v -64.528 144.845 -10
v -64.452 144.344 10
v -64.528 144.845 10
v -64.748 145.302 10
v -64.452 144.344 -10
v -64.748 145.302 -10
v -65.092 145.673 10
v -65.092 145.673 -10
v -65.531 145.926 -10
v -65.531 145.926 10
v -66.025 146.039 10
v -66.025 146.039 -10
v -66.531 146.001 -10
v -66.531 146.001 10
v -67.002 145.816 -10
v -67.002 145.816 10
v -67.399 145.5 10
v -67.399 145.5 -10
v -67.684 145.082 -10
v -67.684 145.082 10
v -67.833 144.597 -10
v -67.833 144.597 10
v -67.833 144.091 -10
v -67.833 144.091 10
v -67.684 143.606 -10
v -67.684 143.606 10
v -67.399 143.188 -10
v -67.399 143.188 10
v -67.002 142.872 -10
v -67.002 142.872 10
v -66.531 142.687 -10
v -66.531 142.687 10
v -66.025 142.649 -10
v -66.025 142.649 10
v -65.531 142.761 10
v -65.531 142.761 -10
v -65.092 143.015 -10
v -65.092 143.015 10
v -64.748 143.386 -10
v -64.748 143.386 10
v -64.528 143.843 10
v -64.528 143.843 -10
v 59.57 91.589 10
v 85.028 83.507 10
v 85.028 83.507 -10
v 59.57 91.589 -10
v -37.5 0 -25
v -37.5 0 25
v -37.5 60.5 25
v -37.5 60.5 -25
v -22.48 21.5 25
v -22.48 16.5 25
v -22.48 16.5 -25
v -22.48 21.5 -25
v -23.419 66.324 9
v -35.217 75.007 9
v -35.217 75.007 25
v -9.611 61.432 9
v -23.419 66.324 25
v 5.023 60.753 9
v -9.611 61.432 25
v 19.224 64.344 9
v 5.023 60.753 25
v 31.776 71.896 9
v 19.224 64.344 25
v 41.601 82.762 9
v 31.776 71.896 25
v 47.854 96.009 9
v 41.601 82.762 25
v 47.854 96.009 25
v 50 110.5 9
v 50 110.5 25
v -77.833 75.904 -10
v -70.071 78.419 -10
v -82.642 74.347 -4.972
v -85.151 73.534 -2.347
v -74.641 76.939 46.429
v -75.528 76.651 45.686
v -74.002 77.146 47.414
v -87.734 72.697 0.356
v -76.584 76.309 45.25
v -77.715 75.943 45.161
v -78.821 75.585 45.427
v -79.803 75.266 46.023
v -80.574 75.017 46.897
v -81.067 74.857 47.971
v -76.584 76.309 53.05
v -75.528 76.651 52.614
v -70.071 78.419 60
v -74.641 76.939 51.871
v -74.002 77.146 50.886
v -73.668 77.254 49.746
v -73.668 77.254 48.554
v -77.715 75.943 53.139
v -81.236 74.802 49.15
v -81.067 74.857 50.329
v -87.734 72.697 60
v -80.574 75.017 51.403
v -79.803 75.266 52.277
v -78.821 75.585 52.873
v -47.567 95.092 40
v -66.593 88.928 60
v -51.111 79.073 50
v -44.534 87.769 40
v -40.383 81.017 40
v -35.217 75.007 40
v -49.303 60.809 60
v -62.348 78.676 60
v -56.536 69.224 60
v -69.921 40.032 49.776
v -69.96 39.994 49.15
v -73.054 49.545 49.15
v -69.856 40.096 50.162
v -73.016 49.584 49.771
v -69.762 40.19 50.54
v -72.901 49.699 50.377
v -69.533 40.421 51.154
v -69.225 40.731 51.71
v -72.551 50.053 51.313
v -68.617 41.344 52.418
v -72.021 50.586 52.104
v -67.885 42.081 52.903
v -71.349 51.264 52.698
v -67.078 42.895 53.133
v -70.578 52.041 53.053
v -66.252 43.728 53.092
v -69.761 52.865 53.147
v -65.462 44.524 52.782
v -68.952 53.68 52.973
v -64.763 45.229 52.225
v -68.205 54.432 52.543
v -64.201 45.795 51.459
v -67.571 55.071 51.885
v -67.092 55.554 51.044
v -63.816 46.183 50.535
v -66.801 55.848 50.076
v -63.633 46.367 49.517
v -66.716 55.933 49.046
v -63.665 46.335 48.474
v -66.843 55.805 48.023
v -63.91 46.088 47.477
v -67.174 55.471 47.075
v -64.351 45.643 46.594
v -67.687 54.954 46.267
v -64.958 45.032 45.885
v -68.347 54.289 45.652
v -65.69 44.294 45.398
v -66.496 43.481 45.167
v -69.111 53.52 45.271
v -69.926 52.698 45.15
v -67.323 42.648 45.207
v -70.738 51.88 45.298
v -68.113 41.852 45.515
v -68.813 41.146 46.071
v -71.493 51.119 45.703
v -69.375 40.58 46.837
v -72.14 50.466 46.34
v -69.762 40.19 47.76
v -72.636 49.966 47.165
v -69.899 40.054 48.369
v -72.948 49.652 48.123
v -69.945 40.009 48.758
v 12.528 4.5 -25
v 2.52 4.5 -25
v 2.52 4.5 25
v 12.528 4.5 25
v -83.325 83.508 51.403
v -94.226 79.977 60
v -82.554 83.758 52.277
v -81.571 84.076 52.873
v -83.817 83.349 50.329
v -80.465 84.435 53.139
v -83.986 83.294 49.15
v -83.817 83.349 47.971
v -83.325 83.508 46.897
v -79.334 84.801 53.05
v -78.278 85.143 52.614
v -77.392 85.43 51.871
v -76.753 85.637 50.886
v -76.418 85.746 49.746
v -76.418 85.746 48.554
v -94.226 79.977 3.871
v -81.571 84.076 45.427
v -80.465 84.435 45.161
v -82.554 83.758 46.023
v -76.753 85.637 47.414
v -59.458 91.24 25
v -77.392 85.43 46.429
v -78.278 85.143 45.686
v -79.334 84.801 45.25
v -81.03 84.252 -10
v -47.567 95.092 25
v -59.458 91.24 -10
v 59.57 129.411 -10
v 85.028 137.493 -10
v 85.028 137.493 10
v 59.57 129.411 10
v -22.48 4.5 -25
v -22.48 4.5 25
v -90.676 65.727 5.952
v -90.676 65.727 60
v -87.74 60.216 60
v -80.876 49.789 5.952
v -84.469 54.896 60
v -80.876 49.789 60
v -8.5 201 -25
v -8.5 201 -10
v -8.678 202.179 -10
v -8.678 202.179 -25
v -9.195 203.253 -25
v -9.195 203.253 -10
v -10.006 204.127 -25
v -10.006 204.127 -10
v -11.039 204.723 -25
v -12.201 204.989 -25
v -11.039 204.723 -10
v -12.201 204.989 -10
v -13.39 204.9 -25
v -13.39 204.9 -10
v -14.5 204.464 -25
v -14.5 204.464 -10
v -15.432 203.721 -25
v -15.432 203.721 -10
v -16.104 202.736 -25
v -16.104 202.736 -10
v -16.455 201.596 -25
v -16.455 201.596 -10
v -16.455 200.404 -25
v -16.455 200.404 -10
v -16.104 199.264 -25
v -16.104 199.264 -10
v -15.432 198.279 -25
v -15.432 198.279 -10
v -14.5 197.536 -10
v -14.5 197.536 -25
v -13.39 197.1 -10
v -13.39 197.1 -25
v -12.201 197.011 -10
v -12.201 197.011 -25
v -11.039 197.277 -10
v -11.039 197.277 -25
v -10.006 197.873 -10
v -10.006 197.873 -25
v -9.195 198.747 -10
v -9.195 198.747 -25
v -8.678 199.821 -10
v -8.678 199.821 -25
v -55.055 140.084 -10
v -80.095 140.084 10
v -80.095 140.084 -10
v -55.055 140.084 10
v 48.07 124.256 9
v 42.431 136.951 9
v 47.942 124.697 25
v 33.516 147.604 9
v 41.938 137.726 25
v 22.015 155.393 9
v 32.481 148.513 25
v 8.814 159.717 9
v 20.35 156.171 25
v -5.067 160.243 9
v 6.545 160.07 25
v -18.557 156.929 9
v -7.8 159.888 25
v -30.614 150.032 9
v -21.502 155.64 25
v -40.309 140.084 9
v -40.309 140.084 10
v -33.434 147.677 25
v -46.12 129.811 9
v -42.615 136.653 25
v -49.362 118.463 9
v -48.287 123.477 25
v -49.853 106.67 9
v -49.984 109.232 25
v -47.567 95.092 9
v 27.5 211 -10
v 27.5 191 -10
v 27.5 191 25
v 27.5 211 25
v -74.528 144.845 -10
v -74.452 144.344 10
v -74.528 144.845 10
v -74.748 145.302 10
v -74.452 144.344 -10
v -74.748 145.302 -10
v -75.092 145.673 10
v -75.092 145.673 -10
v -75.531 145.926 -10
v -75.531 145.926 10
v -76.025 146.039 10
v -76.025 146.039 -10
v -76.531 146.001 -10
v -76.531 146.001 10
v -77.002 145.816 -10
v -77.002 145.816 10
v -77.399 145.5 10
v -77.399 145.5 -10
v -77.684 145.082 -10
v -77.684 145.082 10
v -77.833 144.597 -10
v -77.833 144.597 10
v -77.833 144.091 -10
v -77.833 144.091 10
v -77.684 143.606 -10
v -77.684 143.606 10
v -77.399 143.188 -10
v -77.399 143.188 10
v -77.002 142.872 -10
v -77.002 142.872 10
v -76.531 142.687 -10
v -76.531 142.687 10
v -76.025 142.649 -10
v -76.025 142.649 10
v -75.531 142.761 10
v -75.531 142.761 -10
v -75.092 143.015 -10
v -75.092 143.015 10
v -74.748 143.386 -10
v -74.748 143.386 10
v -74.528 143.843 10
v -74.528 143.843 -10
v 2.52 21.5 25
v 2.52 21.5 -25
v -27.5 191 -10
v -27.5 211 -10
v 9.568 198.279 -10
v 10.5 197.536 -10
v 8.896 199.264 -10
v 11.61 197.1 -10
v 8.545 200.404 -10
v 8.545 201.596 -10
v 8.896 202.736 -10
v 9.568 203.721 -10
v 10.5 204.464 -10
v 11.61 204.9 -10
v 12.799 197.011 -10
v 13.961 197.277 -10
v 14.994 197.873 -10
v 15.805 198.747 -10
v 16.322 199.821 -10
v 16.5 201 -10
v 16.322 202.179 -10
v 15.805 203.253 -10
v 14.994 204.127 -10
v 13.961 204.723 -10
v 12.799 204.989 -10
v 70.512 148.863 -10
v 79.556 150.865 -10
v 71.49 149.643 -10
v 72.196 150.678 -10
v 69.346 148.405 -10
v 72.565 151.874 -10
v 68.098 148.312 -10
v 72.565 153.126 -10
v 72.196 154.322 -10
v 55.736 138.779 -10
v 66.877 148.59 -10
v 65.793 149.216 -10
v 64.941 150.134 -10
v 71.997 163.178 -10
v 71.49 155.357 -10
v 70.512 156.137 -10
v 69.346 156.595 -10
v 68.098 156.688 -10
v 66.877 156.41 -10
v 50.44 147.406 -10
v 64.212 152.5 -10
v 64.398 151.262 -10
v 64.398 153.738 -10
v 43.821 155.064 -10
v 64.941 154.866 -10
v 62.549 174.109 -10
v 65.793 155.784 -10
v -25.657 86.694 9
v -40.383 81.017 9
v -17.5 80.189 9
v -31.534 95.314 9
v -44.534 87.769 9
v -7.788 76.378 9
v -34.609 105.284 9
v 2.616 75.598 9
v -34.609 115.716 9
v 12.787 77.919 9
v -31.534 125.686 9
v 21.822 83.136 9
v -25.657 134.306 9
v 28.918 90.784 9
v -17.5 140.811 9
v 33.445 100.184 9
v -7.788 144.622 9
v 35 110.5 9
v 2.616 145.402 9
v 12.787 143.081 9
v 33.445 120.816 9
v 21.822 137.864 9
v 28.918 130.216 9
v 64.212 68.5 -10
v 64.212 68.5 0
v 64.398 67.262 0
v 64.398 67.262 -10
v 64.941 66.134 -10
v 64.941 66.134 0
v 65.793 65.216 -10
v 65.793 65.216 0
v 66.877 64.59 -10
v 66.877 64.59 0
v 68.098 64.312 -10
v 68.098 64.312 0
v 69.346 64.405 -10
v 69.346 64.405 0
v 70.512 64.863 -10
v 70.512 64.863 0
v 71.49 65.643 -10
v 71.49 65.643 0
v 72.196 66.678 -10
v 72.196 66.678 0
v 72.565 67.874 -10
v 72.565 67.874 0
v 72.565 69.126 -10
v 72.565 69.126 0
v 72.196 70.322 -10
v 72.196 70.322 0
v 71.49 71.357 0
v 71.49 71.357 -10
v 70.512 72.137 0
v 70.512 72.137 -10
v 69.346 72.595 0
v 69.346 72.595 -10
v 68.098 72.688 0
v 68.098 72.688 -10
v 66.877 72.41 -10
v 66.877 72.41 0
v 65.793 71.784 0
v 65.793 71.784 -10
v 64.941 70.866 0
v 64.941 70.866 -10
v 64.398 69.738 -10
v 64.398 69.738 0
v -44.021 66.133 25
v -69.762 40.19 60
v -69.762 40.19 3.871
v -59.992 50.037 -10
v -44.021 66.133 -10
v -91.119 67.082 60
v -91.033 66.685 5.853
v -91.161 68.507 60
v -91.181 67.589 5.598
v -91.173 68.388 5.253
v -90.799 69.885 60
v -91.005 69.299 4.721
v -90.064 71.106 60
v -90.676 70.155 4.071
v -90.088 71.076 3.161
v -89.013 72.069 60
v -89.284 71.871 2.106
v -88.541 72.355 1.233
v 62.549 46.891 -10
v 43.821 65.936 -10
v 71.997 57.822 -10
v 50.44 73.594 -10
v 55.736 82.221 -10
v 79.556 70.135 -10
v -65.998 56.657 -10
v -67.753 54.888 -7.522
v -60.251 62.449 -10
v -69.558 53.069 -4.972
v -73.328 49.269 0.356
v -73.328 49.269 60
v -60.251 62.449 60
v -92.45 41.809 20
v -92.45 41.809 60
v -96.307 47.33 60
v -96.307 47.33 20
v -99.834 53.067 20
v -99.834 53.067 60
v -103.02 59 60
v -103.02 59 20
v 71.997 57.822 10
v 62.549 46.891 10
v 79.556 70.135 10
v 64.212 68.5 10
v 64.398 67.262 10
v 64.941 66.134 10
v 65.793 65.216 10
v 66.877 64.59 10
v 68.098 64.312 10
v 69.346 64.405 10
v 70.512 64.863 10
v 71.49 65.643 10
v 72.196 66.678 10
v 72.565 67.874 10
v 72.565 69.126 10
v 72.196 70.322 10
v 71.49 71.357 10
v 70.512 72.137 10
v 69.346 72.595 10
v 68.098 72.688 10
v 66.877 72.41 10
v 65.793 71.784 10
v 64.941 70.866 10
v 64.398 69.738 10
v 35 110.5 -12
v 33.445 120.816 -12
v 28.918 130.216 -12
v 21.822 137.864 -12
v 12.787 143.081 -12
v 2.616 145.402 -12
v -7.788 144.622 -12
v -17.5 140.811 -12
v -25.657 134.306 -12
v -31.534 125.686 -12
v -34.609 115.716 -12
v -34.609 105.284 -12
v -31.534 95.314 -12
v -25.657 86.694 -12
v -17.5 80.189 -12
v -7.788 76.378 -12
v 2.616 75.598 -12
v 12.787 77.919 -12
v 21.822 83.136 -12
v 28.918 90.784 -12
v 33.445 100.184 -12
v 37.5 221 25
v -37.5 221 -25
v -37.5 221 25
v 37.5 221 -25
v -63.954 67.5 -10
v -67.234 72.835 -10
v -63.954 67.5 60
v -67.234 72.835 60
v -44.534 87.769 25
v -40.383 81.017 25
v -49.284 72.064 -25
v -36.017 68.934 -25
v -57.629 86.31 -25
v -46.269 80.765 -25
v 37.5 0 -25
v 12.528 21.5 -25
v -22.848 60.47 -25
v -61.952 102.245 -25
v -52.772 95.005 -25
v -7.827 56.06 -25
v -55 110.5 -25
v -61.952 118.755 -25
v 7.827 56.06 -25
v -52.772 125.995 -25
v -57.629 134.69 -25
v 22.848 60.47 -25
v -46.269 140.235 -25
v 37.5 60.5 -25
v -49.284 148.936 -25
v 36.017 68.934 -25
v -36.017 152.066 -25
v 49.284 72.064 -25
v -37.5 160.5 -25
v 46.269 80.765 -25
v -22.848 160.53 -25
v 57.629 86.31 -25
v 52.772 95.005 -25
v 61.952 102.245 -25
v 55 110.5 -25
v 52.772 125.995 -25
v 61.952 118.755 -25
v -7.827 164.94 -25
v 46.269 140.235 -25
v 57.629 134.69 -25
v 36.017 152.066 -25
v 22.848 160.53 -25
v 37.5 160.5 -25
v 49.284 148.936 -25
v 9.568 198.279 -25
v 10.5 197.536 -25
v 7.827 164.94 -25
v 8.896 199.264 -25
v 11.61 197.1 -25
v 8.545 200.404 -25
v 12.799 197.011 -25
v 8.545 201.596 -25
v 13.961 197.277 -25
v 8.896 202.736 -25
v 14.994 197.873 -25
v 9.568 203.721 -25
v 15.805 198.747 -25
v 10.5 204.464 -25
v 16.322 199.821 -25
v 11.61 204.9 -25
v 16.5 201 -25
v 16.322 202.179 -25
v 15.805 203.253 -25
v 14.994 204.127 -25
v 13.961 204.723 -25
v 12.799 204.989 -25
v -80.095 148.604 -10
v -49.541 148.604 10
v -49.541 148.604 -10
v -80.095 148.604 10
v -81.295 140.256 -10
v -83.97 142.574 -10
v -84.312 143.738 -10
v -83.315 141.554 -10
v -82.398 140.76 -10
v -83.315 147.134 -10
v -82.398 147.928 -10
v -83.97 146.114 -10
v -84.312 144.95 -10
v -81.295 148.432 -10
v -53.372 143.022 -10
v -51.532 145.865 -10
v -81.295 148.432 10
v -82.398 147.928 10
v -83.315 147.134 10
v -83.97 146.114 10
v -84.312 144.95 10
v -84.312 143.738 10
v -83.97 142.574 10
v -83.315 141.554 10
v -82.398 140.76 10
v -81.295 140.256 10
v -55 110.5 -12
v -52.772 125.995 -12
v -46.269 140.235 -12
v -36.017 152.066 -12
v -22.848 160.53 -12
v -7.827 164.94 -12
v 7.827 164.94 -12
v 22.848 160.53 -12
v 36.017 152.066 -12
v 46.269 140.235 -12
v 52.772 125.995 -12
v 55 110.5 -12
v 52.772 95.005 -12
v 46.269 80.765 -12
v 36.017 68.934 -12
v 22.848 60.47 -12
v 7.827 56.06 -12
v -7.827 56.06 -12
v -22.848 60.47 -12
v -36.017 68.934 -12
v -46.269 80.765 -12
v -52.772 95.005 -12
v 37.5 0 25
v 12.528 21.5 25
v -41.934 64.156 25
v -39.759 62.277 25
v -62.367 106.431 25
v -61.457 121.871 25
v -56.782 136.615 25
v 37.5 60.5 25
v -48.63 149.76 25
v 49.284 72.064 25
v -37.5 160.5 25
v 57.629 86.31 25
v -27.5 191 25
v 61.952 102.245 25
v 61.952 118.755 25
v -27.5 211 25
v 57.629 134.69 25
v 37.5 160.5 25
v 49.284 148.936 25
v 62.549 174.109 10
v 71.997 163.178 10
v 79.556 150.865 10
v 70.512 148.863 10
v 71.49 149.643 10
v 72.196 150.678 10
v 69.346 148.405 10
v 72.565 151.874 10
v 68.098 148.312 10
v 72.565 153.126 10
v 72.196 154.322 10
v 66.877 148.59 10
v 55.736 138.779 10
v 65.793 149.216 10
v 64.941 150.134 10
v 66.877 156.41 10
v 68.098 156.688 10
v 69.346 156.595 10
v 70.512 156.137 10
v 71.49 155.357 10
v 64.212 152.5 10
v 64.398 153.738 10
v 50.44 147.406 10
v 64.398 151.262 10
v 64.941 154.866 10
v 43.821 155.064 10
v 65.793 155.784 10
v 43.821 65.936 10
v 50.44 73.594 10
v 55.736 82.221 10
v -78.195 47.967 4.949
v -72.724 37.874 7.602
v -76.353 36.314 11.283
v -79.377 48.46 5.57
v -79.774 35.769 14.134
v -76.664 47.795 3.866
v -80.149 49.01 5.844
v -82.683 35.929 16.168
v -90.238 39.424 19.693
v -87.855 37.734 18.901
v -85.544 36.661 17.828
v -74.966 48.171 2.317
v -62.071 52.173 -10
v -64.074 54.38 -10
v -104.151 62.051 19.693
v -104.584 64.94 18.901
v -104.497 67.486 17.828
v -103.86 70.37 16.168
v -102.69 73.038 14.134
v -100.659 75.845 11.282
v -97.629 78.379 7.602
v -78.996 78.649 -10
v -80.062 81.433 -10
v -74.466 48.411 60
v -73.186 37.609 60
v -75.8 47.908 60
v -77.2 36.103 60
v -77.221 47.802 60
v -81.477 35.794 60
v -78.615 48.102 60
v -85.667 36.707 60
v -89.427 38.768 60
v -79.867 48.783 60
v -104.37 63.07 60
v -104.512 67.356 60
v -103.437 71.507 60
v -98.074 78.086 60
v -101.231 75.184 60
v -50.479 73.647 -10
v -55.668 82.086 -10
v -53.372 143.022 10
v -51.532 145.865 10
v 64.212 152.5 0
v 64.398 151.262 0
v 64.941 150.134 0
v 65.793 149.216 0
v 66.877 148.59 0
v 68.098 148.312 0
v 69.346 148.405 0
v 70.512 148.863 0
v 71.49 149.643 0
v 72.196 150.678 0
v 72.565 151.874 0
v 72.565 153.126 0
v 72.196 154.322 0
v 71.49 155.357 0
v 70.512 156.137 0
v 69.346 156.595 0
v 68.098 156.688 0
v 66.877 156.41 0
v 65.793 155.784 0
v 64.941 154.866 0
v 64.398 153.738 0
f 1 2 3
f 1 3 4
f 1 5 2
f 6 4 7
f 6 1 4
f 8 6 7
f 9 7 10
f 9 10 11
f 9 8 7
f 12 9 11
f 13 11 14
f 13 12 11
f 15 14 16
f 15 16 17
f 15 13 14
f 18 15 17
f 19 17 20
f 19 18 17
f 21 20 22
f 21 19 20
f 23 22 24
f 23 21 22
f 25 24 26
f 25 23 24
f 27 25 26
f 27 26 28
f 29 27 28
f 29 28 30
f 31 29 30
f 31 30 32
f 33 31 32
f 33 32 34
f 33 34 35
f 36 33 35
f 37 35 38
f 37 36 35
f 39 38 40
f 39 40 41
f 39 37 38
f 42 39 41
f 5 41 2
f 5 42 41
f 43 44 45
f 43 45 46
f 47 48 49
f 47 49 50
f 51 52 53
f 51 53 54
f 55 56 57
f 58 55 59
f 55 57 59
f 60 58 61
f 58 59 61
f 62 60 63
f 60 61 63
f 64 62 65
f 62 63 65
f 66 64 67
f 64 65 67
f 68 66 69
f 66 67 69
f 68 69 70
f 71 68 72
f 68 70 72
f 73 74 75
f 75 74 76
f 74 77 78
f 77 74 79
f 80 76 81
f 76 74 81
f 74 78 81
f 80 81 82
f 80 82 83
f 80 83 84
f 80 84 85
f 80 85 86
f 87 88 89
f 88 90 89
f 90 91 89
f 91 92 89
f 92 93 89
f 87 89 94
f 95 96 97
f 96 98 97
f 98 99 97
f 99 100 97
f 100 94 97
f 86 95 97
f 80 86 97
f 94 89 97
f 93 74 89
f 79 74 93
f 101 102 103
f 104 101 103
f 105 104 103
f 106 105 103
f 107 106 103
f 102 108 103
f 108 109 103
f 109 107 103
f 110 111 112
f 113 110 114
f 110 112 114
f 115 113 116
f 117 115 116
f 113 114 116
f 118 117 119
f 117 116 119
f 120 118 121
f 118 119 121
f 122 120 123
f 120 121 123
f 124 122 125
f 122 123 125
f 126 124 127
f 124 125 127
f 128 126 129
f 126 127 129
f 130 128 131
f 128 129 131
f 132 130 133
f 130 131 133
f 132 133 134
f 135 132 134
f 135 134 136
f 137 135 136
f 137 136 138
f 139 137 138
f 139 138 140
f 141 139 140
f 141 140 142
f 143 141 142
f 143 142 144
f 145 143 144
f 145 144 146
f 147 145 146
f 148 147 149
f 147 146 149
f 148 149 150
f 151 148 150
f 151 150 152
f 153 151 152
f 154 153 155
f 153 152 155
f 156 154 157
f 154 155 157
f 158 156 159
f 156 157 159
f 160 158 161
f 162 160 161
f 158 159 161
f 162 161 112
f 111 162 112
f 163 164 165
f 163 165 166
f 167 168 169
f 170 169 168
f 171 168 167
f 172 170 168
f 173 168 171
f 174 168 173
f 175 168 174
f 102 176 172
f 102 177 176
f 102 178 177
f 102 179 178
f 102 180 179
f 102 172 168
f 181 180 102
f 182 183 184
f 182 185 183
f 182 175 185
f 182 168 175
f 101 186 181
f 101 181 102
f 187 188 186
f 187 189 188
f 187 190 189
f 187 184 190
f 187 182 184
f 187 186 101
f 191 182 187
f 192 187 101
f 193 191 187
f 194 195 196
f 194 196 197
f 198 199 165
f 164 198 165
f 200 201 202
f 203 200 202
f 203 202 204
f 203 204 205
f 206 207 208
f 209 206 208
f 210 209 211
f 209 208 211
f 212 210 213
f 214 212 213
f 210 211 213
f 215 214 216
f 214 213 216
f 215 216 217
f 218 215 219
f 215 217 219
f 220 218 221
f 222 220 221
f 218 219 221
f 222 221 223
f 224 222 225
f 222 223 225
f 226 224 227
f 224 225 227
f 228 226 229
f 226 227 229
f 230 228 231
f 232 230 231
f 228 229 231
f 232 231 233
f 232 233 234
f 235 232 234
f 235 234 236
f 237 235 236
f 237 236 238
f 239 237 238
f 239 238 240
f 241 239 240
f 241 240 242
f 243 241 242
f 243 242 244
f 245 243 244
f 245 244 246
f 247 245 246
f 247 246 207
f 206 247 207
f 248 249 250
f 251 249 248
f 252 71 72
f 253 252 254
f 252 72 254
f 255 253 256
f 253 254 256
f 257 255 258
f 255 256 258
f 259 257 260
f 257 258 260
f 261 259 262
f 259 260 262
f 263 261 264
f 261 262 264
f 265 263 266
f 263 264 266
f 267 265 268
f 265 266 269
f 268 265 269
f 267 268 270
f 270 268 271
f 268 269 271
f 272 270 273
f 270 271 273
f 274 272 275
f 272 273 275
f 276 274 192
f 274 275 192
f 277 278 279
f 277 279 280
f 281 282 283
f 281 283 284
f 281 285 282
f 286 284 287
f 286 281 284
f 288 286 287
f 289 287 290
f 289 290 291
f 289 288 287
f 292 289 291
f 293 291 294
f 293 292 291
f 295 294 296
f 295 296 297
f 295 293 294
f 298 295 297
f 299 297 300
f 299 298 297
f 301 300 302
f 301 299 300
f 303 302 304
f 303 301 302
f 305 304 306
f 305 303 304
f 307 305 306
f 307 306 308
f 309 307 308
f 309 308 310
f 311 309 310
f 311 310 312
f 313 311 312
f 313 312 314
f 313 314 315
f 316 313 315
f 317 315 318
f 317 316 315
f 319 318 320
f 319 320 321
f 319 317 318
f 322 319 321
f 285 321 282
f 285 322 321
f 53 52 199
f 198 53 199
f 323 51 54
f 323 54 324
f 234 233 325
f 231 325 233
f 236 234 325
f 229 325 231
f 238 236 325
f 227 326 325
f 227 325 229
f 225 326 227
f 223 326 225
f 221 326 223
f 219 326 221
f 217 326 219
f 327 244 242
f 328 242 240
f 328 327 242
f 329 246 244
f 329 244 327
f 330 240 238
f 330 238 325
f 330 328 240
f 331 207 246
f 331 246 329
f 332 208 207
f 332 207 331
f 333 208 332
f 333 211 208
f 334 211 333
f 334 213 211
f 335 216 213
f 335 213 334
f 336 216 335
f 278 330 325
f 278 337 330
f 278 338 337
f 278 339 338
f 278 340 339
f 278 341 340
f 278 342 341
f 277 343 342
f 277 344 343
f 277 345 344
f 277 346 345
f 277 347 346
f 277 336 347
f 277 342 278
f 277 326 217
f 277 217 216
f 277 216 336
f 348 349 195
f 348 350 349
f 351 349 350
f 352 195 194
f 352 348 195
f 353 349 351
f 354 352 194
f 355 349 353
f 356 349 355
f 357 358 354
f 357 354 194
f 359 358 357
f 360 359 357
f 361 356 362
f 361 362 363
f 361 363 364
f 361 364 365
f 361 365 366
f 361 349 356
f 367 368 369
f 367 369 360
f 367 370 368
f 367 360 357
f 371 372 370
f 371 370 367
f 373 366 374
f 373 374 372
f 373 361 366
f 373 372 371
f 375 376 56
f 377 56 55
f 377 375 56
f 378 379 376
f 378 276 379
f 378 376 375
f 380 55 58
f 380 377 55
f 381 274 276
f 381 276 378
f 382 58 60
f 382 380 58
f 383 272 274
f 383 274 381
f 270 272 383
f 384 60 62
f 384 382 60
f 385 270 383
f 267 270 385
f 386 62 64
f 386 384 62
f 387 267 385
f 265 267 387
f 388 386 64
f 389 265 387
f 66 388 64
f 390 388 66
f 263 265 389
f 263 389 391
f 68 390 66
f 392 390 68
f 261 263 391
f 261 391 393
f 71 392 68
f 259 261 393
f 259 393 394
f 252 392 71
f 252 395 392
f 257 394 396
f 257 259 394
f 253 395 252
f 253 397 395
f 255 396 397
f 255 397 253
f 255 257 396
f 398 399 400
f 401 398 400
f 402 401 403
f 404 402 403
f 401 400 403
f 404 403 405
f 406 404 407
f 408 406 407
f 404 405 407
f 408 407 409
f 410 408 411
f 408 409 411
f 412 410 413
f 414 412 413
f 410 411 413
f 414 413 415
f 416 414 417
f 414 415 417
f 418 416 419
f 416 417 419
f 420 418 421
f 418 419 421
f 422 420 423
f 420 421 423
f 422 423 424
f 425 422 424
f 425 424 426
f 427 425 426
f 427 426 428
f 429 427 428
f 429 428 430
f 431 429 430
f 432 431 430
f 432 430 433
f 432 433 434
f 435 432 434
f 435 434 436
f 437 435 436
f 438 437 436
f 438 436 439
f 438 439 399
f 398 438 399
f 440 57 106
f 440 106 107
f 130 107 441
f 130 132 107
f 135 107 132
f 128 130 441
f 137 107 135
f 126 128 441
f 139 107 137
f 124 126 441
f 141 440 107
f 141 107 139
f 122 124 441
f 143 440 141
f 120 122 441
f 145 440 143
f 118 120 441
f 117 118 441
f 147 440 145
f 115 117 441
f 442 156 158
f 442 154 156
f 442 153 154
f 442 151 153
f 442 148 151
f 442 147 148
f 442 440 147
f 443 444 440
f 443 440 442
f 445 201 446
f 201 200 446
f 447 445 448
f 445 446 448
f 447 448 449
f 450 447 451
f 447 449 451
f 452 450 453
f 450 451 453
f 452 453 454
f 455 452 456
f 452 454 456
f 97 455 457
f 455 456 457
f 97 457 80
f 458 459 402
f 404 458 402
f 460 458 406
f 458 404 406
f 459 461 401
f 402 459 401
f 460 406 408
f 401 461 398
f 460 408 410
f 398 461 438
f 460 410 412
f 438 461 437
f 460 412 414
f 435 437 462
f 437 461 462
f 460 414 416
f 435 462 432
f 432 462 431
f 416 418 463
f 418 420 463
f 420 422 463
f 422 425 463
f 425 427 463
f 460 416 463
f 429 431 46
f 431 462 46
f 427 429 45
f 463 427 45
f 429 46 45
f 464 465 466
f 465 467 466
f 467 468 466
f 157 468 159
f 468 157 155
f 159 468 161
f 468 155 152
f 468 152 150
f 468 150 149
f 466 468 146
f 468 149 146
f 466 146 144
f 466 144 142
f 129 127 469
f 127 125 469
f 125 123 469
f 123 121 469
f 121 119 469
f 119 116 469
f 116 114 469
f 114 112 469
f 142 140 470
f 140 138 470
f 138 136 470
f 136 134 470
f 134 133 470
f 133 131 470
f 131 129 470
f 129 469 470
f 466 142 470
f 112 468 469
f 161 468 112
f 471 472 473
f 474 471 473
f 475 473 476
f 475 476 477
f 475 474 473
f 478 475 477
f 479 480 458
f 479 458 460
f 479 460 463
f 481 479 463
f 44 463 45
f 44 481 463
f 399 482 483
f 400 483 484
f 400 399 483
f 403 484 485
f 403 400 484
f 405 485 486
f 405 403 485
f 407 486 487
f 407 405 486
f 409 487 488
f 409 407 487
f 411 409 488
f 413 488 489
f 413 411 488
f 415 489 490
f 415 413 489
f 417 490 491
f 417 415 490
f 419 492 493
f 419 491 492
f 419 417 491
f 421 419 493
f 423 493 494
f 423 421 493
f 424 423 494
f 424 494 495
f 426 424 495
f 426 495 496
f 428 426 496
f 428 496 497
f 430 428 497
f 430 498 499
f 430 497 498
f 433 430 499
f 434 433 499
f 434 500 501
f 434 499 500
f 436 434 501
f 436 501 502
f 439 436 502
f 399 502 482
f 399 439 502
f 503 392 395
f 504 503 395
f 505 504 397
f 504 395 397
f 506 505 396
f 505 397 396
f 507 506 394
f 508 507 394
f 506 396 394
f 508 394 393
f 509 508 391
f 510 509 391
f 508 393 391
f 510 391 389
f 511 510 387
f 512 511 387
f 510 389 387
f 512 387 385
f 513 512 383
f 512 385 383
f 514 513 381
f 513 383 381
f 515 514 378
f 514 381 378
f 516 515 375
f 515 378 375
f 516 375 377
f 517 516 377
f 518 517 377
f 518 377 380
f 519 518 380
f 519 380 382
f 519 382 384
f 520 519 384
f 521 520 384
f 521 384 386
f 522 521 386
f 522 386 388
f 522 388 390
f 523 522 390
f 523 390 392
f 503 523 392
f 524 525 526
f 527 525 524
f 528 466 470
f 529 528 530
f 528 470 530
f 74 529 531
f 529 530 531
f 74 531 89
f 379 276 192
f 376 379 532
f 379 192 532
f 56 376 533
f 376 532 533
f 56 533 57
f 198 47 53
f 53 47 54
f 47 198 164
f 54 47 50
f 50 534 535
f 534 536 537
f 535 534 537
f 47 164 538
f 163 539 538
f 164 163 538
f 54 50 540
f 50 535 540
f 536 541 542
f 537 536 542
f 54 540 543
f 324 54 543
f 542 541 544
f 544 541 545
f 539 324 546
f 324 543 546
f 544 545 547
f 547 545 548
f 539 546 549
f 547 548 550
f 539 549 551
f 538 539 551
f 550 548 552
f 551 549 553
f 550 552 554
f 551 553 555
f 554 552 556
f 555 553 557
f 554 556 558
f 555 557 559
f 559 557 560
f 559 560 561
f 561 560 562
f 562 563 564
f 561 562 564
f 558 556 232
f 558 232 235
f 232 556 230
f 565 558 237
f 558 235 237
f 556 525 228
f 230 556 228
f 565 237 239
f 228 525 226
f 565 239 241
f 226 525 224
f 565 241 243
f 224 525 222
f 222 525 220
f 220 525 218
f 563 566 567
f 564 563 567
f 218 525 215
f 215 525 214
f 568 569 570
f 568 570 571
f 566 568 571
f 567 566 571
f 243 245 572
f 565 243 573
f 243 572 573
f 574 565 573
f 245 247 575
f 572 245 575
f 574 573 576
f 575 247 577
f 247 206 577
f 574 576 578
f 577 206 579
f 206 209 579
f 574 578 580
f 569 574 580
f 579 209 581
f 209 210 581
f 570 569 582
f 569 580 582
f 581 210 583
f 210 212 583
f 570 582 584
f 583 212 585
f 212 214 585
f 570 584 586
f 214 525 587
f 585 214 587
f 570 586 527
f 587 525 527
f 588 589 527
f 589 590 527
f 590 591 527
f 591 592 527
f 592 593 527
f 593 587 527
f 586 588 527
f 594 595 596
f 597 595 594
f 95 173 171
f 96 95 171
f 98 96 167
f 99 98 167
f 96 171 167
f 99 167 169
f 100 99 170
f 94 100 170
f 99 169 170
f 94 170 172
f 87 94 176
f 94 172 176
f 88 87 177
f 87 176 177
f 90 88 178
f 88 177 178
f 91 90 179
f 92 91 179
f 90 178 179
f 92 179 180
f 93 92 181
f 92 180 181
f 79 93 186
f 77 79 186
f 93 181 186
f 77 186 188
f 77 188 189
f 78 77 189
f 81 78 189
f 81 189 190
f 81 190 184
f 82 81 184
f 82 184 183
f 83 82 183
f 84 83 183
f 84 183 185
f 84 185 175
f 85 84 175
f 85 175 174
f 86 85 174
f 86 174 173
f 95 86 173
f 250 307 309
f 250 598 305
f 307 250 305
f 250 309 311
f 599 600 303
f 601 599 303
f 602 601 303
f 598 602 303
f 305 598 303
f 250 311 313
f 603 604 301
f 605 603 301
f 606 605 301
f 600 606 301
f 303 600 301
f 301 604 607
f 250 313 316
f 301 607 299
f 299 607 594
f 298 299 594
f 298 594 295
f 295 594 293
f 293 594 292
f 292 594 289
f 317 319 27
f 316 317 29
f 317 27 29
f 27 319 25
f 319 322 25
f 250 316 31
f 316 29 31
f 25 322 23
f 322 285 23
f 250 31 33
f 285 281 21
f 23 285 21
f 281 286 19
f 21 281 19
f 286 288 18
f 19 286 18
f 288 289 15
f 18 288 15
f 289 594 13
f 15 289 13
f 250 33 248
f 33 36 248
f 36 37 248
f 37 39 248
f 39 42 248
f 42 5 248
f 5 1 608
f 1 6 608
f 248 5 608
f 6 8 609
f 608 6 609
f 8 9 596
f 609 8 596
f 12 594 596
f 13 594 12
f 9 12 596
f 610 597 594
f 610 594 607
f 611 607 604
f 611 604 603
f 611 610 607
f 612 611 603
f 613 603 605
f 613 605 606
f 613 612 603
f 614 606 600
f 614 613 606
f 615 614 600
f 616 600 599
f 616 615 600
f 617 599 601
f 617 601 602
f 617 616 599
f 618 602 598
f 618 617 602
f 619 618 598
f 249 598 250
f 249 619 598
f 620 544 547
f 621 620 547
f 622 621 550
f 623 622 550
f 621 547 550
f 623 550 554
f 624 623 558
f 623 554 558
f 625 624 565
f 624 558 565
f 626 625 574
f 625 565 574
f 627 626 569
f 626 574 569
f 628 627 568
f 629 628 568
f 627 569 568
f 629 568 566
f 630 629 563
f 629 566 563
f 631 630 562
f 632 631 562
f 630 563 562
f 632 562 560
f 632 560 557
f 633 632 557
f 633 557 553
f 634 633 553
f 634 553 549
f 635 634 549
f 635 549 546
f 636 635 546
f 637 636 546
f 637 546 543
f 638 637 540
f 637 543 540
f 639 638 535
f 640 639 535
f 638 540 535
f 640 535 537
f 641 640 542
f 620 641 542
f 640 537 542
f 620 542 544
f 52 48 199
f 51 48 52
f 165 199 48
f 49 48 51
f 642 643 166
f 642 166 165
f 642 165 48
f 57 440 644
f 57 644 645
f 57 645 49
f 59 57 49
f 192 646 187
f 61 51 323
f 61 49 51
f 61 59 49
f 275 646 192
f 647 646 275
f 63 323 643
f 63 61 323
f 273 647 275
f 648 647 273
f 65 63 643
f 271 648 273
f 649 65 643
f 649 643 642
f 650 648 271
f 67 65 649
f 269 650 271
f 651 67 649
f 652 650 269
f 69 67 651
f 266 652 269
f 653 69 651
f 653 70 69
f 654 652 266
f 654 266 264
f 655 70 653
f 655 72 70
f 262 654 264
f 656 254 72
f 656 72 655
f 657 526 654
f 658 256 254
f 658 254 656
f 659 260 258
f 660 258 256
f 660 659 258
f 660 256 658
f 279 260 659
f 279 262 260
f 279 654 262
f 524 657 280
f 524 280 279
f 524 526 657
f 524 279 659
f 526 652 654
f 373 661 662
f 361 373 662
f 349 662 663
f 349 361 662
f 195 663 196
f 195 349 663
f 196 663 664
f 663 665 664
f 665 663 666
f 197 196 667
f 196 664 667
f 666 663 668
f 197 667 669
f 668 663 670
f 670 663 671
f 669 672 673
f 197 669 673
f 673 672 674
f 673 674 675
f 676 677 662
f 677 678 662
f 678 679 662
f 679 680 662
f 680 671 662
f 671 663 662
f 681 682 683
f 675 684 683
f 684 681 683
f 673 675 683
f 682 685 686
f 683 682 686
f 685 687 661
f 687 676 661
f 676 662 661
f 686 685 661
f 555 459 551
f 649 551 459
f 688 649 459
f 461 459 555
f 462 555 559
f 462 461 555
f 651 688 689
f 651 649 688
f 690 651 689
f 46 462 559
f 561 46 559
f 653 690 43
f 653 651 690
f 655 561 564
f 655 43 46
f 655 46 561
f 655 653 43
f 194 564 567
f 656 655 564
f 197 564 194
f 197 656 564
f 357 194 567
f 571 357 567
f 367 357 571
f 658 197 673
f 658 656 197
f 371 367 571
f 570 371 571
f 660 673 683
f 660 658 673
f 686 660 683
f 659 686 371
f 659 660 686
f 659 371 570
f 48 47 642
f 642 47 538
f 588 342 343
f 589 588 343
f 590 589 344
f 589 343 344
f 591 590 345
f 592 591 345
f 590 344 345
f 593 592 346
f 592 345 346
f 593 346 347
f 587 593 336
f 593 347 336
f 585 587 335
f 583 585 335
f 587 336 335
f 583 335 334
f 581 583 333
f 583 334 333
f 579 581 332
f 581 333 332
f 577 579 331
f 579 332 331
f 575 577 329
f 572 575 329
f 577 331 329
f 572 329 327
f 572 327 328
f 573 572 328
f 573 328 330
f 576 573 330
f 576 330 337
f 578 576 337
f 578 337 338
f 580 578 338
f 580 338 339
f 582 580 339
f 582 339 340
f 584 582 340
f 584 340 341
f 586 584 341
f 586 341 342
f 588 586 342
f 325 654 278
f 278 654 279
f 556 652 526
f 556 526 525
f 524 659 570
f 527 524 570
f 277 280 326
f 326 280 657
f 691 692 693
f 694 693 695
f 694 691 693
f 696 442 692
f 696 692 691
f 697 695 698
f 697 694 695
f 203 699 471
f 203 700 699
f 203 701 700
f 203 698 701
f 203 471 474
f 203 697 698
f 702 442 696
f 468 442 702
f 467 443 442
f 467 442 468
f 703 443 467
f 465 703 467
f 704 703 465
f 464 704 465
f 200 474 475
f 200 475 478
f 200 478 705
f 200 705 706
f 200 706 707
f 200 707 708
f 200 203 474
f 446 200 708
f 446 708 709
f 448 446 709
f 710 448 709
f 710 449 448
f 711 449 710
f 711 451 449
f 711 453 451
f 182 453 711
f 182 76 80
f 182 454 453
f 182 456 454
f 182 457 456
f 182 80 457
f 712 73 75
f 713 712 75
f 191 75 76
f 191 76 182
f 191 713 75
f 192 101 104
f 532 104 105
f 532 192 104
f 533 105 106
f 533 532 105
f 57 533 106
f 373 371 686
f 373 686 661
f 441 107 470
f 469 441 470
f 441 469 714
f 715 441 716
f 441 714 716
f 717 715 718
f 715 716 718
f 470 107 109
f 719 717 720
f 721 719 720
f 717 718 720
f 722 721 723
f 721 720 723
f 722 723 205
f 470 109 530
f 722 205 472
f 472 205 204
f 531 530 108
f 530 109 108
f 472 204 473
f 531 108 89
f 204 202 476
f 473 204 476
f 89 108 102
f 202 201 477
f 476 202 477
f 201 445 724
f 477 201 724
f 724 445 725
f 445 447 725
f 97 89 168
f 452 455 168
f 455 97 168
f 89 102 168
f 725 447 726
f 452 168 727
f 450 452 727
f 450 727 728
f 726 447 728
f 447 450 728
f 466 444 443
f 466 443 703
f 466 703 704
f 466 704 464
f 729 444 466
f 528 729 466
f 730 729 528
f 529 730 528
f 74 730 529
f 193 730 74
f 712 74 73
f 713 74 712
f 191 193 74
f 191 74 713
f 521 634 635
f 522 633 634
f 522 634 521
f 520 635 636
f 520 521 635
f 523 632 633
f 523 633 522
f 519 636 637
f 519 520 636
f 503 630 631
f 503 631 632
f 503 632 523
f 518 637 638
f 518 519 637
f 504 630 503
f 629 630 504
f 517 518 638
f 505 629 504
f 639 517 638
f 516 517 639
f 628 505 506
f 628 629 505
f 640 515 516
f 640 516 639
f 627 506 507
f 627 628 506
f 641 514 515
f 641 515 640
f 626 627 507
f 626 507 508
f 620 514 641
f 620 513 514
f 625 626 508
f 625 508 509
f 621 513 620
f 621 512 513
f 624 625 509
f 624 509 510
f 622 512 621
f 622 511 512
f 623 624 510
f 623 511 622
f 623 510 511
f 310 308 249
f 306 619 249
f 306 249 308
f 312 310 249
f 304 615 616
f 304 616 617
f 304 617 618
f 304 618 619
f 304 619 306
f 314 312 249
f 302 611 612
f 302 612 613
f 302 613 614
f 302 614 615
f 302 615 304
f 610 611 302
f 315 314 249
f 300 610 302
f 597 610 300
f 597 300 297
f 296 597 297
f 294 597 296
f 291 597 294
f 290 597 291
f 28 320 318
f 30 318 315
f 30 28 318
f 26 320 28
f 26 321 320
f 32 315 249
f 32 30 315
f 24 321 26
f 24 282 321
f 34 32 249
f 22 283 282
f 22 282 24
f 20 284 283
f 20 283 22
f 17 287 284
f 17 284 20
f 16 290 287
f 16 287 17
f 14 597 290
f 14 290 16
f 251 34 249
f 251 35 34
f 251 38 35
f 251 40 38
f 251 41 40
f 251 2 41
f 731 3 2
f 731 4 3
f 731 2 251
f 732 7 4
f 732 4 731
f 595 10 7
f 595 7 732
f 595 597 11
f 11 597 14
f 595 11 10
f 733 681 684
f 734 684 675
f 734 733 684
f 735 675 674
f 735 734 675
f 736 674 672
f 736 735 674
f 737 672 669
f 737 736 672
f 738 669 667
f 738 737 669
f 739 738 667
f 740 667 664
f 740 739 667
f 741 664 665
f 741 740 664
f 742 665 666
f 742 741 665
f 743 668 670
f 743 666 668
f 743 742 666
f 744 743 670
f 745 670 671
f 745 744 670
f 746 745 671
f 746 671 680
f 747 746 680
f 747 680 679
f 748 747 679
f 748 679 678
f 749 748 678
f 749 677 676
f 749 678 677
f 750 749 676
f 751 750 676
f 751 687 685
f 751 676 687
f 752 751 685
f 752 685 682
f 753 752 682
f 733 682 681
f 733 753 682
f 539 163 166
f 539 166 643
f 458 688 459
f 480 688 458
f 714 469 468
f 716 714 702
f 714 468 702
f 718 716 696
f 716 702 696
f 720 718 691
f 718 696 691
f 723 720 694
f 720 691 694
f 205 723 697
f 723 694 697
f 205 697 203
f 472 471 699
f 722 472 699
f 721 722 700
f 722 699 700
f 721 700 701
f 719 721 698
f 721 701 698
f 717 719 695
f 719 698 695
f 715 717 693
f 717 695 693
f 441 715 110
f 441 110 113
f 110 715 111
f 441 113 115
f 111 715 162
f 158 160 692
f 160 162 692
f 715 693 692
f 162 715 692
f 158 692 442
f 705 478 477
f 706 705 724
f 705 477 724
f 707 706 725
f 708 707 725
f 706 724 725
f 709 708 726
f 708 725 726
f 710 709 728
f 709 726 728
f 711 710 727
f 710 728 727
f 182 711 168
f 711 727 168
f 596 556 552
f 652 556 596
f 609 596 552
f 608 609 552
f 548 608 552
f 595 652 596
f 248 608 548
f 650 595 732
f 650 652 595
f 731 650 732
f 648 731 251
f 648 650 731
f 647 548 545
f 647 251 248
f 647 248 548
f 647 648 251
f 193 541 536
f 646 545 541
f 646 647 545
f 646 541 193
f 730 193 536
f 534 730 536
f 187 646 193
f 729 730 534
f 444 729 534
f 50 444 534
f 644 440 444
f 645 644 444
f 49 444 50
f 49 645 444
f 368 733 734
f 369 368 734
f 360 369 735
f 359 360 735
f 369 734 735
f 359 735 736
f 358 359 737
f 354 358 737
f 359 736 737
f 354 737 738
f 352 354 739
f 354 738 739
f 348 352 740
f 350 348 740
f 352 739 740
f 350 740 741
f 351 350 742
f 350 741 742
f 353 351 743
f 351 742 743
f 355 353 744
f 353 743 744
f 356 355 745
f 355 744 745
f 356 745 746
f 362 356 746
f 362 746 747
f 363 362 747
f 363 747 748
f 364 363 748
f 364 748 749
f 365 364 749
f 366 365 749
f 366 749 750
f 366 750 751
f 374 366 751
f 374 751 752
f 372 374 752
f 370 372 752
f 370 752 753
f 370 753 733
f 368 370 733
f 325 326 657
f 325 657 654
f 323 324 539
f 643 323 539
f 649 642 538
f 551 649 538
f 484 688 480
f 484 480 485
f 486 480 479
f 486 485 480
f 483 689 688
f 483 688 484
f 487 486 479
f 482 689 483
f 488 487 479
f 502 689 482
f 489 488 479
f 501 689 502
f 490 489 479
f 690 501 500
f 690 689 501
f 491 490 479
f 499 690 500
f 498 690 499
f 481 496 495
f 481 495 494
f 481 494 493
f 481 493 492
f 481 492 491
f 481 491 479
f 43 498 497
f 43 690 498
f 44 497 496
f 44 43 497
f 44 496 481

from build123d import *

# Parameters (mm, degrees)
SKETCH1_W                          = 75
SKETCH1_H                          = 50.00000000000001
BE_MAIN_UPRIGHT_BODY_DEPTH         = 221
SKETCH19_R                         = 62.5
BOSS_EXTRUDE1_DEPTH                = 50
SKETCH4_R                          = 35
CE_THROUGH_HOLE_DEPTH              = 236.04733565816056
SKETCH2_R                          = 50
CE_INNER_BEARING_DEPTH             = 16
SKETCH3_R                          = 55
CE_OUTER_BEARING_DEPTH             = 13
BE_CALIPER_MOUNT_V2_DEPTH          = 10
BE_TIE_ROD_MOUNT_V2_DEPTH          = 60.00000000000001
BE_TIE_ROD_MOUNT_V2_DEPTH_BACK     = 9.999999999999996
SKETCH32_R                         = 1.7000000000000146
BE_TEMP_SENSOR_MOUNT_V3_DEPTH      = 10
CE_CALIPER_HOLES_REACH             = 255.863
SKETCH26_R                         = 4.199999999999994
SKETCH26_R_2                       = 4.1999999999999975
CE_CALIPER_HOLES_DIRECTION_2_REACH = 255.863
SKETCH12_R                         = 4.0000000000000036
SKETCH12_R_2                       = 4
CE_TOP_CLEVIS_HOLES_DEPTH          = 252.68750278067682
CE_TOP_CLEVIS_SPACE_DEPTH          = 35
CE_BOTTOM_CLEVIS_SPACE_DEPTH       = 252.68750278067682
SKETCH15_W                         = 25.000000000000004
SKETCH15_H                         = 5
CE_EXPAND_BOTTOM_CLEVIS_DEPTH      = 252.68750278067682
CE_WIDEN_BOTTOM_CLEVIS_DEPTH       = 249.87031277664735
CE_WIDEN_BOTTOM_CLEVIS_DEPTH_BACK  = 249.87031277664735
SKETCH16_W                         = 10.00755403153164
SKETCH16_H                         = 17
CHAMFER1_SIZE                      = 20
CHAMFER2_SIZE                      = 30
CUT_EXTRUDE1_REACH                 = 180.963
SKETCH28_R                         = 4.000000000000007
CUT_EXTRUDE2_REACH                 = 262.905
FILLET2_R                          = 15
FILLET3_R                          = 5


with BuildPart() as part:
    # Sketch1 → BE - main upright body (new body)
    with BuildSketch(Plane(origin=(0, 0, 0), x_dir=(1, 0, 0), z_dir=(0, 1, 0))):
        Rectangle(SKETCH1_W, SKETCH1_H)
    extrude(amount=BE_MAIN_UPRIGHT_BODY_DEPTH)

    # Sketch19 → Boss-Extrude1 (add)
    with BuildSketch(Plane.XY.offset(25)):
        with Locations((0, 110.5)):
            Circle(SKETCH19_R)
    extrude(amount=-BOSS_EXTRUDE1_DEPTH)

    # Sketch4 → CE - Through hole (cut, through all)
    with BuildSketch(Plane.XY.offset(25)):
        with Locations((6.57e-15, 110.5)):
            Circle(SKETCH4_R)
    extrude(amount=-CE_THROUGH_HOLE_DEPTH, mode=Mode.SUBTRACT)

    # Sketch2 → CE - Inner bearing (cut)
    with BuildSketch(Plane.XY.offset(25)):
        with Locations((5.2e-15, 110.5)):
            Circle(SKETCH2_R)
    extrude(amount=-CE_INNER_BEARING_DEPTH, mode=Mode.SUBTRACT)

    # Sketch3 → CE - Outer bearing (cut)
    with BuildSketch(Plane(origin=(0, 0, -25), x_dir=(-1, 0, 0), z_dir=(0, 0, -1))):
        with Locations((0, 110.5)):
            Circle(SKETCH3_R)
    extrude(amount=-CE_OUTER_BEARING_DEPTH, mode=Mode.SUBTRACT)

    # Sketch23 → BE - caliper mount v2 (add, symmetric)
    with BuildSketch(Plane.XY):
        with BuildLine():
            Line((35.05710874811726, 146.15107468538196), (62.54897572629606, 174.1087311459216))
            ThreePointArc((62.54897572629606, 174.1087311459216), (76.02582114581824, 157.1746136728197), (85.02821067036592, 137.4934887074417))
            Line((85.02821067036592, 137.4934887074417), (47.65614773889368, 125.62916331753813))
            ThreePointArc((47.65614773889368, 125.62916331753813), (42.610537560783285, 136.65993288946052), (35.05710874811726, 146.15107468538196))
        make_face()
        with BuildLine():
            Line((35.05710874811726, 74.84892531461804), (62.54897572629606, 46.89126885407838))
            ThreePointArc((62.54897572629606, 46.89126885407838), (76.02582114581824, 63.82538632718028), (85.02821067036592, 83.50651129255829))
            Line((85.02821067036592, 83.50651129255829), (47.65614773889368, 95.37083668246188))
            ThreePointArc((47.65614773889368, 95.37083668246188), (42.61053756078329, 84.34006711053948), (35.05710874811726, 74.84892531461804))
        make_face()
    extrude(amount=BE_CALIPER_MOUNT_V2_DEPTH, both=True)

    # Sketch24 → BE - tie rod mount v2 (add, two sides: drawn at the far end of the back side and taken through both)
    with BuildSketch(Plane.XY.offset(-BE_TIE_ROD_MOUNT_V2_DEPTH_BACK)):
        with BuildLine():
            Line((-35.21675994796843, 75.00662288866886), (-81.12210695526274, 28.74070304926003))
            ThreePointArc((-81.12210695526274, 28.74070304926003), (-98.11223118223046, 50.172817344210976), (-109.57006459783258, 75.00662288866886))
            Line((-109.57006459783258, 75.00662288866886), (-47.56659814757113, 95.0916016190039))
            ThreePointArc((-47.56659814757113, 95.0916016190039), (-42.592519144130065, 84.31074050384561), (-35.21675994796843, 75.00662288866886))
        make_face()
    extrude(amount=BE_TIE_ROD_MOUNT_V2_DEPTH + BE_TIE_ROD_MOUNT_V2_DEPTH_BACK)

    # Sketch32 → BE - temp sensor mount v3 (add, symmetric)
    with BuildSketch(Plane.XY):
        with BuildLine():
            Line((-40.308968964609726, 148.60437176531212), (-80.09470245298189, 148.60437176531215))
            ThreePointArc((-80.09470245298189, 148.60437176531215), (-84.35510834631509, 144.34396587197895), (-80.09470245298189, 140.08355997864578))
            Line((-80.09470245298189, 140.08355997864578), (-40.30896896460972, 140.08355997864575))
            Line((-40.30896896460972, 140.08355997864575), (-40.308968964609726, 148.60437176531212))
        make_face()
        with Locations((-76.1523345656343, 144.34396587197895)):
            Circle(SKETCH32_R, mode=Mode.SUBTRACT)
        with Locations((-66.1523345656343, 144.34396587197895)):
            Circle(SKETCH32_R, mode=Mode.SUBTRACT)
    extrude(amount=BE_TEMP_SENSOR_MOUNT_V3_DEPTH, both=True)

    # Sketch26 → CE - caliper holes (cut, up to next)
    with BuildSketch(Plane.XY, mode=Mode.PRIVATE) as ce_caliper_holes_sk1:
        with Locations(Location((68.41158901726085, 68.50000000000001, 0), (0, 0, 180))):
            Circle(SKETCH26_R)
    ce_caliper_holes_tool1 = extrude(ce_caliper_holes_sk1.sketch, amount=-CE_CALIPER_HOLES_REACH, mode=Mode.PRIVATE) & part.part
    # Sketch26 → CE - caliper holes (cut, up to next)
    with BuildSketch(Plane.XY, mode=Mode.PRIVATE) as ce_caliper_holes_sk2:
        with Locations(Location((68.41158901726085, 152.49999999999997, 0), (0, 0, 180))):
            Circle(SKETCH26_R_2)
    ce_caliper_holes_tool2 = extrude(ce_caliper_holes_sk2.sketch, amount=-CE_CALIPER_HOLES_REACH, mode=Mode.PRIVATE) & part.part
    add(ce_caliper_holes_tool1.solids().sort_by_distance((68.411589, 68.5, 0))[0], mode=Mode.SUBTRACT)
    add(ce_caliper_holes_tool2.solids().sort_by_distance((68.411589, 152.5, 0))[0], mode=Mode.SUBTRACT)

    # Sketch26 → CE - caliper holes direction 2 (cut, up to next)
    with BuildSketch(Plane.XY, mode=Mode.PRIVATE) as ce_caliper_holes_direction_2_sk1:
        with Locations(Location((68.41158901726085, 68.50000000000001, 0), (0, 0, 180))):
            Circle(SKETCH26_R)
    ce_caliper_holes_direction_2_tool1 = extrude(ce_caliper_holes_direction_2_sk1.sketch, amount=CE_CALIPER_HOLES_DIRECTION_2_REACH, mode=Mode.PRIVATE) & part.part
    # Sketch26 → CE - caliper holes direction 2 (cut, up to next)
    with BuildSketch(Plane.XY, mode=Mode.PRIVATE) as ce_caliper_holes_direction_2_sk2:
        with Locations(Location((68.41158901726085, 152.49999999999997, 0), (0, 0, 180))):
            Circle(SKETCH26_R_2)
    ce_caliper_holes_direction_2_tool2 = extrude(ce_caliper_holes_direction_2_sk2.sketch, amount=CE_CALIPER_HOLES_DIRECTION_2_REACH, mode=Mode.PRIVATE) & part.part
    add(ce_caliper_holes_direction_2_tool1.solids().sort_by_distance((68.411589, 68.5, 0))[0], mode=Mode.SUBTRACT)
    add(ce_caliper_holes_direction_2_tool2.solids().sort_by_distance((68.411589, 152.5, 0))[0], mode=Mode.SUBTRACT)

    # Sketch12 → CE - top clevis holes (cut, through all)
    with BuildSketch(Plane.XY.offset(25)):
        with Locations((-12.5, 201)):
            Circle(SKETCH12_R)
        with Locations((12.5, 201)):
            Circle(SKETCH12_R_2)
    extrude(amount=-CE_TOP_CLEVIS_HOLES_DEPTH, mode=Mode.SUBTRACT)

    # Sketch13 → CE - top clevis space (cut)
    with BuildSketch(Plane.XY.offset(25)):
        Polygon((-27.499999999999968, 191.00000000000006), (27.500000000000032, 191.00000000000006), (27.500000000000032, 211.00000000000003), (-27.499999999999968, 211.00000000000006), align=None)
    extrude(amount=-CE_TOP_CLEVIS_SPACE_DEPTH, mode=Mode.SUBTRACT)

    # Sketch14 → CE - bottom clevis space (cut, through all)
    with BuildSketch(Plane.XY.offset(25)):
        Polygon((-22.48000000000002, 4.500000000000011), (2.5199999999999796, 4.500000000000011), (2.51999999999998, 16.50000000000001), (-22.48000000000002, 16.50000000000001), align=None)
    extrude(amount=-CE_BOTTOM_CLEVIS_SPACE_DEPTH, mode=Mode.SUBTRACT)

    # Sketch15 → CE - expand bottom clevis (cut, through all)
    with BuildSketch(Plane.XY.offset(25)):
        with Locations((-9.98000000000002, 19.00000000000001)):
            Rectangle(SKETCH15_W, SKETCH15_H)
    extrude(amount=-CE_EXPAND_BOTTOM_CLEVIS_DEPTH, mode=Mode.SUBTRACT)

    # Sketch16 → CE - widen bottom clevis (cut, two sides: drawn at the far end of the back side and taken through both)
    with BuildSketch(Plane(origin=(2.5199999999999796, 4.500000000000011, 25), x_dir=(1, 0, 0), z_dir=(0, 0, 1)).offset(-CE_WIDEN_BOTTOM_CLEVIS_DEPTH_BACK)):
        with Locations((5.00377701576582, 8.5)):
            Rectangle(SKETCH16_W, SKETCH16_H)
    extrude(amount=CE_WIDEN_BOTTOM_CLEVIS_DEPTH + CE_WIDEN_BOTTOM_CLEVIS_DEPTH_BACK, mode=Mode.SUBTRACT)

    # Chamfer1
    chamfer1_edges = [part.edges().sort_by_distance(p)[0] for p in [
        (-42.592519144130065, 84.31074050384561, 60.00000000000001),
    ]]
    chamfer(chamfer1_edges, length=CHAMFER1_SIZE)

    # Chamfer2
    chamfer2_edges = [part.edges().sort_by_distance(p)[0] for p in [
        (-98.11223118223045, 50.17281734421098, -9.999999999999996),
    ]]
    chamfer(chamfer2_edges, length=CHAMFER2_SIZE)

    # Cut-Extrude1: up to this plane
    cut_extrude1_end = Plane(origin=(-35.21675994796843, 75.00662288866886, -9.999999999999996), z_dir=(0.7098675422266223, -0.7043351989593695, 0))
    # Sketch28 → Cut-Extrude1 (cut, up to the surface)
    with BuildSketch(Plane(origin=(-32.39528914978471, 100.00609166249728, 0), x_dir=(0.951331962951422, 0.3081679676199239, 0), z_dir=(-0.3081679676199238, 0.9513319629514219, 0)), mode=Mode.PRIVATE) as cut_extrude1_sk1:
        with Locations(Location((-50.230429584814566, -49.15, 0), (0, 0, 180))):
            Circle(SKETCH28_R)
    cut_extrude1_tool1 = split(extrude(cut_extrude1_sk1.sketch, amount=-CUT_EXTRUDE1_REACH, mode=Mode.PRIVATE), bisect_by=cut_extrude1_end, keep=Keep.BOTH, mode=Mode.PRIVATE)
    add(cut_extrude1_tool1.solids().sort_by_distance((-80.181102, 84.526682, 49.15))[0], mode=Mode.SUBTRACT)

    # Sketch29 → Cut-Extrude2 (cut, up to next)
    with BuildSketch(Plane.XY.offset(60.00000000000001), mode=Mode.PRIVATE) as cut_extrude2_sk1:
        with BuildLine():
            Line((-70.0705275210271, 78.4190759215617), (-93.07971814036846, 70.96563612779761))
            ThreePointArc((-93.07971814036846, 70.96563612779761), (-86.14562004973435, 57.53083914090252), (-77.28611251700346, 45.279936615492176))
            Line((-77.28611251700346, 45.279936615492176), (-60.250857228734134, 62.4489987616883))
            ThreePointArc((-60.250857228734134, 62.4489987616883), (-65.64812771052121, 70.13432343060958), (-70.0705275210271, 78.4190759215617))
        make_face()
    cut_extrude2_tool1 = extrude(cut_extrude2_sk1.sketch, amount=-CUT_EXTRUDE2_REACH, mode=Mode.PRIVATE) & part.part
    add(cut_extrude2_tool1.solids().sort_by_distance((-76.449162, 63.492991, 60))[0], mode=Mode.SUBTRACT)

    # Fillet2
    # the kernel refuses this fillet: 15 mm, written as the material it takes off along each edge
    with BuildSketch(Plane(origin=(-81.12210695526272, 28.740703049260055, -23.23718779420447), x_dir=(0.70433519895937, 0.7098675422266219, 0), z_dir=(0, 0, 1))) as fillet2_piece_1:
        with BuildLine():
            CenterArc((16.129396420502527, 15.000000000000002), FILLET2_R, 171.38829576022673, 98.6117042397733)
            ThreePointArc((1.2985092148828912, 17.246059815362816), (0.3250860863217871, 8.647437558840888), (0, 0))
            Line((0, 0), (16.12939642050253, 3.6e-16))
        make_face()
    extrude(amount=126.47437558840895, mode=Mode.SUBTRACT)
    with BuildSketch(Plane(origin=(-109.57006459783257, 75.00662288866886, 103.23718779420446), x_dir=(0.3787247076655996, -0.9255093709971856, 0), z_dir=(0, 0, -1))) as fillet2_piece_2:
        with BuildLine():
            CenterArc((16.16866645235697, -14.957662051341691), FILLET2_R, 85.69414788011332, 98.61170423977336)
            Line((1.2110044010152803, -16.083870716666514), (0, 0))
            ThreePointArc((0, 0), (8.6474375588409, 0.3250860863217989), (17.29487511768179, -4.5e-16))
        make_face()
    extrude(amount=126.47437558840892, mode=Mode.SUBTRACT)

    # Fillet3
    fillet3_edges = [part.edges().sort_by_distance(p)[0] for p in [
        (-77.28611251700346, 45.279936615492176, 32.976107440368864),
        (-93.07971814036846, 70.96563612779761, 32.976107440368864),
    ]]
    fillet(fillet3_edges, radius=FILLET3_R)


solid = part.part
